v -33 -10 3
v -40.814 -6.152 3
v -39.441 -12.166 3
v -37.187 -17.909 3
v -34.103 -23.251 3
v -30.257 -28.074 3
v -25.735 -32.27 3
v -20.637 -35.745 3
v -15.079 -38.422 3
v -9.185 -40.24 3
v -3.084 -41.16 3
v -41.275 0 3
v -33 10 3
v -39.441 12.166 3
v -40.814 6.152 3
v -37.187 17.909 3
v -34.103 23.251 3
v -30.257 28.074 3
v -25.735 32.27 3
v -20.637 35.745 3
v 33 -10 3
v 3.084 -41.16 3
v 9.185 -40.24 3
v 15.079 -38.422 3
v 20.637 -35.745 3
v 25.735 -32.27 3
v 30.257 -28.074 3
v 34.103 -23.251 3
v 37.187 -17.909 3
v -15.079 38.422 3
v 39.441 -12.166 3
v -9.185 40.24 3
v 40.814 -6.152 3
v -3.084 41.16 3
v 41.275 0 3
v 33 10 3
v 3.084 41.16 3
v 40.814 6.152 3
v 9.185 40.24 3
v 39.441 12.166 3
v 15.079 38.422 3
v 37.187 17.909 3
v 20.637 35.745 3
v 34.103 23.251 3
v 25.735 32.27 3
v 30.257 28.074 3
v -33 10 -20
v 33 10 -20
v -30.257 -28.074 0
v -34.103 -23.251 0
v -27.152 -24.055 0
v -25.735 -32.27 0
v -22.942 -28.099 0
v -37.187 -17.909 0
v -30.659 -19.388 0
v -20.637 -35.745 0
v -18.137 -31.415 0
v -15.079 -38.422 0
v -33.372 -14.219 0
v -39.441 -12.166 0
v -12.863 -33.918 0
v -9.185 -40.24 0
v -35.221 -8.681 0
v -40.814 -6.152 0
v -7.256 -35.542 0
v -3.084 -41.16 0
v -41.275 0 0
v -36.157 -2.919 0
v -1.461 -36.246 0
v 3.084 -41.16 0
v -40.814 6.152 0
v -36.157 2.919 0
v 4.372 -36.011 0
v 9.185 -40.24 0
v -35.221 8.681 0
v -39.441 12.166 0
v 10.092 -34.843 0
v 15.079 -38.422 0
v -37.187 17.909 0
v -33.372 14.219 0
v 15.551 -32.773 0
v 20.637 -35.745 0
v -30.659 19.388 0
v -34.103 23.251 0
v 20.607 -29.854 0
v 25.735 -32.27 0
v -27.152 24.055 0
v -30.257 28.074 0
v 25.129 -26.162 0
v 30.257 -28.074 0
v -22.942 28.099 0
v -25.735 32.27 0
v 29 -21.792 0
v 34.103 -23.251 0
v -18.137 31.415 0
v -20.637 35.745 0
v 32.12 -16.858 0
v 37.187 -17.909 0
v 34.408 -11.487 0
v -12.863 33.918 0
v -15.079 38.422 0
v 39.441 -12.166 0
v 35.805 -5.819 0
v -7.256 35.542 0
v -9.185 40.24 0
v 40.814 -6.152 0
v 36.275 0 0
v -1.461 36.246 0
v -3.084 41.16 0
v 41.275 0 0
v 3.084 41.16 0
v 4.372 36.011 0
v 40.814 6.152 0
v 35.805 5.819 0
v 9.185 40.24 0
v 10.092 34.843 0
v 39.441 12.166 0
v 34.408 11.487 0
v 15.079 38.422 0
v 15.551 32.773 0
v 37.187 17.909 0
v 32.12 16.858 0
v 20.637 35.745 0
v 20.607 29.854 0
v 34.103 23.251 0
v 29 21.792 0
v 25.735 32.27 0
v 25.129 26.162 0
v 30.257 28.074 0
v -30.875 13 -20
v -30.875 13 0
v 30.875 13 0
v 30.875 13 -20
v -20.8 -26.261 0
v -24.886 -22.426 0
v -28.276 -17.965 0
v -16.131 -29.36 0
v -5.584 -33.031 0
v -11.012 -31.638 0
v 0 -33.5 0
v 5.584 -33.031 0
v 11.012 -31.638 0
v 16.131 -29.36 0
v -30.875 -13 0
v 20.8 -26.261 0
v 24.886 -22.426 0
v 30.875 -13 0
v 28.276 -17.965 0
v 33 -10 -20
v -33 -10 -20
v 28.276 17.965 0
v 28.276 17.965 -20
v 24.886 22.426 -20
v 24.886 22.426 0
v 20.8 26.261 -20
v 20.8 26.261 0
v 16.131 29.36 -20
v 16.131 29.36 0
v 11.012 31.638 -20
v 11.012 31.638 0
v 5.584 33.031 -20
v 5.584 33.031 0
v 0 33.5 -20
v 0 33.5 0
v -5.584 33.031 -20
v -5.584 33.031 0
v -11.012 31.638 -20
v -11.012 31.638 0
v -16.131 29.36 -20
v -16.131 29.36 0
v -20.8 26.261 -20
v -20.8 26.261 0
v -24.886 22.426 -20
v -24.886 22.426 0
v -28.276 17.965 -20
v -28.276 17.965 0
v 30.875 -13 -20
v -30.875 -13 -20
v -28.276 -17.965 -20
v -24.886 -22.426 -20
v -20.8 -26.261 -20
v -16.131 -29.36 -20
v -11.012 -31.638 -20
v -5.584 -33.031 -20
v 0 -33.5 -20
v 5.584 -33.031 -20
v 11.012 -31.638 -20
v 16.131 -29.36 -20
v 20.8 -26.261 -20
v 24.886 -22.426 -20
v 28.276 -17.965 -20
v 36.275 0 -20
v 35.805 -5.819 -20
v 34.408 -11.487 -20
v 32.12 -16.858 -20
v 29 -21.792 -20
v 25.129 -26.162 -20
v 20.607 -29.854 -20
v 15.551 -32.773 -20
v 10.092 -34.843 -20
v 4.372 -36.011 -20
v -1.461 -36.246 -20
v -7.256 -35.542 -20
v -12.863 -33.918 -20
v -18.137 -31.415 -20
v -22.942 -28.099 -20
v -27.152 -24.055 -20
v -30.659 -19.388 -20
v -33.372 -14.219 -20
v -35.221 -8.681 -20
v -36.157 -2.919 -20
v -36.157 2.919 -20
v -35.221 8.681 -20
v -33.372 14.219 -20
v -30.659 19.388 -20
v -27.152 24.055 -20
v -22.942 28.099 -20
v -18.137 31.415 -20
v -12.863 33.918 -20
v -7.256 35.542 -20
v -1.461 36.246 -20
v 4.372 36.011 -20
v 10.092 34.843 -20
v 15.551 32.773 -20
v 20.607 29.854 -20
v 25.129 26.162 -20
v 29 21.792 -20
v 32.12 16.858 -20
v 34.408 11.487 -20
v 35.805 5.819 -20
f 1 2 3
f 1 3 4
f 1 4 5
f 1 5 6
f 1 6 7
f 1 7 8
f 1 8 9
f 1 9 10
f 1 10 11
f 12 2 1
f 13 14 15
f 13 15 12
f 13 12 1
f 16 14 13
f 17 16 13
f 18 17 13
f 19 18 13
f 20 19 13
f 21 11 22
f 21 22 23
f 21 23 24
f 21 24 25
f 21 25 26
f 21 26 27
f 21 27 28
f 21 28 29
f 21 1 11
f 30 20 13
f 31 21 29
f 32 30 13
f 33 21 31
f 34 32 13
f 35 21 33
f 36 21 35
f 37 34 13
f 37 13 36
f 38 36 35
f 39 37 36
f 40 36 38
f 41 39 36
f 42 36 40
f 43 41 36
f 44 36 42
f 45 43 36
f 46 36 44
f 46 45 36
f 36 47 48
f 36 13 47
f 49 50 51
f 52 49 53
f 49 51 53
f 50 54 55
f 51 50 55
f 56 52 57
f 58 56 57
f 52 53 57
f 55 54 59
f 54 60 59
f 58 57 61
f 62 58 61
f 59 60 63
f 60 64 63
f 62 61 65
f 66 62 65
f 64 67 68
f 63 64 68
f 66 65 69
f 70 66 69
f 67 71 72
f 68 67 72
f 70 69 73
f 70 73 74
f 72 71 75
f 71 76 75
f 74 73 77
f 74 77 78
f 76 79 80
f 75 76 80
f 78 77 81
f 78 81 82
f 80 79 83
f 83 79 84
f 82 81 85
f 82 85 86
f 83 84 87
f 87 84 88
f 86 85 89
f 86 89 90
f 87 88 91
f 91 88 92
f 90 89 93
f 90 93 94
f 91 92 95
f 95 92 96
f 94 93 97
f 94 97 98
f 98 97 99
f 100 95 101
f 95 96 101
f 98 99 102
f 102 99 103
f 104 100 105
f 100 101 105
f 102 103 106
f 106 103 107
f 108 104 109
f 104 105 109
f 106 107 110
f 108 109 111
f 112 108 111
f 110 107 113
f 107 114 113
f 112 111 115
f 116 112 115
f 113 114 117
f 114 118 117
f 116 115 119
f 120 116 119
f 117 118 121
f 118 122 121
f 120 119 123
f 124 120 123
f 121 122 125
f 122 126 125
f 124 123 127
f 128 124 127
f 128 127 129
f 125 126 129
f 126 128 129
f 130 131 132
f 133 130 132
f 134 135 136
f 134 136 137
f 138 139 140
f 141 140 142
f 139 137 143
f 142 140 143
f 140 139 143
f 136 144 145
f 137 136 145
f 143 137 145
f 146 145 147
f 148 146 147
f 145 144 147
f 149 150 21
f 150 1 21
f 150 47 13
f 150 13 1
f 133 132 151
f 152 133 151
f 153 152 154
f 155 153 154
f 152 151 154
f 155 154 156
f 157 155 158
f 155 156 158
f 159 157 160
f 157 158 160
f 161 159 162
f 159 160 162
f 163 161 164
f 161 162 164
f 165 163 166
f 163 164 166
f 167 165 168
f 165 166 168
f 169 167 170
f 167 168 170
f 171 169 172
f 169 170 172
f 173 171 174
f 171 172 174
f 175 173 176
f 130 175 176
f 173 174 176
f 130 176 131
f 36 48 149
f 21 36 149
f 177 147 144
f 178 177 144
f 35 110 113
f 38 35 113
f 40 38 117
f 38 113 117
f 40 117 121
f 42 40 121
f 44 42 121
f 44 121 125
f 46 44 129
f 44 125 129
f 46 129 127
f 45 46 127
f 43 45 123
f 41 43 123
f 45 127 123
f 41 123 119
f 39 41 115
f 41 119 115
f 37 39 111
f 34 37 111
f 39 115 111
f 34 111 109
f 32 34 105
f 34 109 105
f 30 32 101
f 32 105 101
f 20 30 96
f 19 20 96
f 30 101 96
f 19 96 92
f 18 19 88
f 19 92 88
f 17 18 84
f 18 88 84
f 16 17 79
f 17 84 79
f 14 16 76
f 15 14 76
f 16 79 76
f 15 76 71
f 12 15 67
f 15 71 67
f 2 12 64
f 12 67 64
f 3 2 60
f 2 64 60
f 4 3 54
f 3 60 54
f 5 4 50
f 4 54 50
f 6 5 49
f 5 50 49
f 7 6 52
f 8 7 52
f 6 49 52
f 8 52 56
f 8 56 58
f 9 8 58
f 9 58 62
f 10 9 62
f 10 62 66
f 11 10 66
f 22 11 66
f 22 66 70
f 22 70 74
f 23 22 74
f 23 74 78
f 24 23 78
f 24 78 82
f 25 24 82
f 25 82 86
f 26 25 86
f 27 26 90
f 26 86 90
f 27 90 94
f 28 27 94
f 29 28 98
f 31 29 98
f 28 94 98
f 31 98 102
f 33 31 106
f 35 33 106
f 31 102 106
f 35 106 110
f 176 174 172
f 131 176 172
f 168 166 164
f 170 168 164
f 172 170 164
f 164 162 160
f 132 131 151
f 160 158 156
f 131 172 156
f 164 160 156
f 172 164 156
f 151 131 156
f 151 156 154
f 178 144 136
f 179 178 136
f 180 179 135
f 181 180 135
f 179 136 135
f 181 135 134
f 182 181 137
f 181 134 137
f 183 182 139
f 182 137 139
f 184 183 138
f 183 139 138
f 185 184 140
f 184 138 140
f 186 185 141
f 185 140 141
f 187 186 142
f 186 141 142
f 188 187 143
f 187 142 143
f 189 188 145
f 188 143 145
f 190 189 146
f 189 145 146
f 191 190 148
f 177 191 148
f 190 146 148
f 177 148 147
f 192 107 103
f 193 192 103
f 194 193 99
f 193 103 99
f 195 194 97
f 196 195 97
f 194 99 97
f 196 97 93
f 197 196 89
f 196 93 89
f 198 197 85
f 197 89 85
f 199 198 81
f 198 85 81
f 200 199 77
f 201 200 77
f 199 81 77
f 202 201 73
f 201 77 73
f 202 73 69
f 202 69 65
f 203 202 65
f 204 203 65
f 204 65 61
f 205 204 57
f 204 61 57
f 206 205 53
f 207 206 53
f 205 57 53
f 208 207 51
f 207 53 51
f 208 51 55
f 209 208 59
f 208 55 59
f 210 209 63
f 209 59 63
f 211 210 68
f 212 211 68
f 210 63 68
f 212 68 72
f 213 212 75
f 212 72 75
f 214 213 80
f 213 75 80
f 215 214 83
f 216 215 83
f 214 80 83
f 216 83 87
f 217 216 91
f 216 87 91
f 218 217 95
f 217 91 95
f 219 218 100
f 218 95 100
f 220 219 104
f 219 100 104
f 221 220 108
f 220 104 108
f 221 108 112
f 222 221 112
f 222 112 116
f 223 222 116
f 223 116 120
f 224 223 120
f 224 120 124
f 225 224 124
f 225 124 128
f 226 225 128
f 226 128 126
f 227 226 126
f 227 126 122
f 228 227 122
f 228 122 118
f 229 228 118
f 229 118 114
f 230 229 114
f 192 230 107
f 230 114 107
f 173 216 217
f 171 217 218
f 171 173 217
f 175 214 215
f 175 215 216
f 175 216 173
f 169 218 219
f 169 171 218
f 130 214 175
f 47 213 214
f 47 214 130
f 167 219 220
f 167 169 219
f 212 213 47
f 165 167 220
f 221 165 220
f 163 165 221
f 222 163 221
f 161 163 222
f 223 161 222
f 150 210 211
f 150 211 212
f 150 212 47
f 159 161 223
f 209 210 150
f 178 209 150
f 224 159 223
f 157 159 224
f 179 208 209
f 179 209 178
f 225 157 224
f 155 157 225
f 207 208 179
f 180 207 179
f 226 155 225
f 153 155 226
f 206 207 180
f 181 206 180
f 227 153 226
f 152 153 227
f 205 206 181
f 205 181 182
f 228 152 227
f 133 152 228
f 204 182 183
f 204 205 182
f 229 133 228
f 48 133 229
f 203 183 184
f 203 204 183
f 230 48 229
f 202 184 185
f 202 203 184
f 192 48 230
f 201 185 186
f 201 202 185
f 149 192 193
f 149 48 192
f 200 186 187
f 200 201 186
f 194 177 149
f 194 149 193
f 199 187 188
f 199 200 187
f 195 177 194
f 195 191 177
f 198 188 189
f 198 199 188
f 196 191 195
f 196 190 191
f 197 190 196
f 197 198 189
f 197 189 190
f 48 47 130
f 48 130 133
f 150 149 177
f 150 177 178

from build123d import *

# Parameters (mm, degrees)
F0_R     = 41.275
F1_DEPTH = 3
F2_W     = 66
F2_H     = 20
F3_DEPTH = 3.001
F4_R     = 36.275
F4_W     = 66
F4_H     = 20
F5_DEPTH = 20


with BuildPart() as f1:
    # F0 (on Top) → F1 (new body)
    with BuildSketch(Plane.XY):
        Circle(F0_R)
    extrude(amount=F1_DEPTH)

    # F2 (on face) → F3 (cut, through all)
    with BuildSketch(Plane.XY.offset(3)):
        Rectangle(F2_W, F2_H)
    extrude(amount=-F3_DEPTH, mode=Mode.SUBTRACT)

    # F4 (on face) → F5 (join)
    with BuildSketch(Plane(origin=(0, 0, 0), x_dir=(1, 0, 0), z_dir=(0, 0, -1))):
        Circle(F4_R)
        with BuildLine():
            ThreePointArc((30.874747, -13), (0, -33.5), (-30.874747, -13))
            Line((-30.874747, -13), (30.874747, -13))
        make_face(mode=Mode.SUBTRACT)
        Rectangle(F4_W, F4_H, mode=Mode.SUBTRACT)
        with BuildLine():
            ThreePointArc((-30.874747, 13), (0, 33.5), (30.874747, 13))
            Line((30.874747, 13), (-30.874747, 13))
        make_face(mode=Mode.SUBTRACT)
    extrude(amount=F5_DEPTH)


solid = f1.part
